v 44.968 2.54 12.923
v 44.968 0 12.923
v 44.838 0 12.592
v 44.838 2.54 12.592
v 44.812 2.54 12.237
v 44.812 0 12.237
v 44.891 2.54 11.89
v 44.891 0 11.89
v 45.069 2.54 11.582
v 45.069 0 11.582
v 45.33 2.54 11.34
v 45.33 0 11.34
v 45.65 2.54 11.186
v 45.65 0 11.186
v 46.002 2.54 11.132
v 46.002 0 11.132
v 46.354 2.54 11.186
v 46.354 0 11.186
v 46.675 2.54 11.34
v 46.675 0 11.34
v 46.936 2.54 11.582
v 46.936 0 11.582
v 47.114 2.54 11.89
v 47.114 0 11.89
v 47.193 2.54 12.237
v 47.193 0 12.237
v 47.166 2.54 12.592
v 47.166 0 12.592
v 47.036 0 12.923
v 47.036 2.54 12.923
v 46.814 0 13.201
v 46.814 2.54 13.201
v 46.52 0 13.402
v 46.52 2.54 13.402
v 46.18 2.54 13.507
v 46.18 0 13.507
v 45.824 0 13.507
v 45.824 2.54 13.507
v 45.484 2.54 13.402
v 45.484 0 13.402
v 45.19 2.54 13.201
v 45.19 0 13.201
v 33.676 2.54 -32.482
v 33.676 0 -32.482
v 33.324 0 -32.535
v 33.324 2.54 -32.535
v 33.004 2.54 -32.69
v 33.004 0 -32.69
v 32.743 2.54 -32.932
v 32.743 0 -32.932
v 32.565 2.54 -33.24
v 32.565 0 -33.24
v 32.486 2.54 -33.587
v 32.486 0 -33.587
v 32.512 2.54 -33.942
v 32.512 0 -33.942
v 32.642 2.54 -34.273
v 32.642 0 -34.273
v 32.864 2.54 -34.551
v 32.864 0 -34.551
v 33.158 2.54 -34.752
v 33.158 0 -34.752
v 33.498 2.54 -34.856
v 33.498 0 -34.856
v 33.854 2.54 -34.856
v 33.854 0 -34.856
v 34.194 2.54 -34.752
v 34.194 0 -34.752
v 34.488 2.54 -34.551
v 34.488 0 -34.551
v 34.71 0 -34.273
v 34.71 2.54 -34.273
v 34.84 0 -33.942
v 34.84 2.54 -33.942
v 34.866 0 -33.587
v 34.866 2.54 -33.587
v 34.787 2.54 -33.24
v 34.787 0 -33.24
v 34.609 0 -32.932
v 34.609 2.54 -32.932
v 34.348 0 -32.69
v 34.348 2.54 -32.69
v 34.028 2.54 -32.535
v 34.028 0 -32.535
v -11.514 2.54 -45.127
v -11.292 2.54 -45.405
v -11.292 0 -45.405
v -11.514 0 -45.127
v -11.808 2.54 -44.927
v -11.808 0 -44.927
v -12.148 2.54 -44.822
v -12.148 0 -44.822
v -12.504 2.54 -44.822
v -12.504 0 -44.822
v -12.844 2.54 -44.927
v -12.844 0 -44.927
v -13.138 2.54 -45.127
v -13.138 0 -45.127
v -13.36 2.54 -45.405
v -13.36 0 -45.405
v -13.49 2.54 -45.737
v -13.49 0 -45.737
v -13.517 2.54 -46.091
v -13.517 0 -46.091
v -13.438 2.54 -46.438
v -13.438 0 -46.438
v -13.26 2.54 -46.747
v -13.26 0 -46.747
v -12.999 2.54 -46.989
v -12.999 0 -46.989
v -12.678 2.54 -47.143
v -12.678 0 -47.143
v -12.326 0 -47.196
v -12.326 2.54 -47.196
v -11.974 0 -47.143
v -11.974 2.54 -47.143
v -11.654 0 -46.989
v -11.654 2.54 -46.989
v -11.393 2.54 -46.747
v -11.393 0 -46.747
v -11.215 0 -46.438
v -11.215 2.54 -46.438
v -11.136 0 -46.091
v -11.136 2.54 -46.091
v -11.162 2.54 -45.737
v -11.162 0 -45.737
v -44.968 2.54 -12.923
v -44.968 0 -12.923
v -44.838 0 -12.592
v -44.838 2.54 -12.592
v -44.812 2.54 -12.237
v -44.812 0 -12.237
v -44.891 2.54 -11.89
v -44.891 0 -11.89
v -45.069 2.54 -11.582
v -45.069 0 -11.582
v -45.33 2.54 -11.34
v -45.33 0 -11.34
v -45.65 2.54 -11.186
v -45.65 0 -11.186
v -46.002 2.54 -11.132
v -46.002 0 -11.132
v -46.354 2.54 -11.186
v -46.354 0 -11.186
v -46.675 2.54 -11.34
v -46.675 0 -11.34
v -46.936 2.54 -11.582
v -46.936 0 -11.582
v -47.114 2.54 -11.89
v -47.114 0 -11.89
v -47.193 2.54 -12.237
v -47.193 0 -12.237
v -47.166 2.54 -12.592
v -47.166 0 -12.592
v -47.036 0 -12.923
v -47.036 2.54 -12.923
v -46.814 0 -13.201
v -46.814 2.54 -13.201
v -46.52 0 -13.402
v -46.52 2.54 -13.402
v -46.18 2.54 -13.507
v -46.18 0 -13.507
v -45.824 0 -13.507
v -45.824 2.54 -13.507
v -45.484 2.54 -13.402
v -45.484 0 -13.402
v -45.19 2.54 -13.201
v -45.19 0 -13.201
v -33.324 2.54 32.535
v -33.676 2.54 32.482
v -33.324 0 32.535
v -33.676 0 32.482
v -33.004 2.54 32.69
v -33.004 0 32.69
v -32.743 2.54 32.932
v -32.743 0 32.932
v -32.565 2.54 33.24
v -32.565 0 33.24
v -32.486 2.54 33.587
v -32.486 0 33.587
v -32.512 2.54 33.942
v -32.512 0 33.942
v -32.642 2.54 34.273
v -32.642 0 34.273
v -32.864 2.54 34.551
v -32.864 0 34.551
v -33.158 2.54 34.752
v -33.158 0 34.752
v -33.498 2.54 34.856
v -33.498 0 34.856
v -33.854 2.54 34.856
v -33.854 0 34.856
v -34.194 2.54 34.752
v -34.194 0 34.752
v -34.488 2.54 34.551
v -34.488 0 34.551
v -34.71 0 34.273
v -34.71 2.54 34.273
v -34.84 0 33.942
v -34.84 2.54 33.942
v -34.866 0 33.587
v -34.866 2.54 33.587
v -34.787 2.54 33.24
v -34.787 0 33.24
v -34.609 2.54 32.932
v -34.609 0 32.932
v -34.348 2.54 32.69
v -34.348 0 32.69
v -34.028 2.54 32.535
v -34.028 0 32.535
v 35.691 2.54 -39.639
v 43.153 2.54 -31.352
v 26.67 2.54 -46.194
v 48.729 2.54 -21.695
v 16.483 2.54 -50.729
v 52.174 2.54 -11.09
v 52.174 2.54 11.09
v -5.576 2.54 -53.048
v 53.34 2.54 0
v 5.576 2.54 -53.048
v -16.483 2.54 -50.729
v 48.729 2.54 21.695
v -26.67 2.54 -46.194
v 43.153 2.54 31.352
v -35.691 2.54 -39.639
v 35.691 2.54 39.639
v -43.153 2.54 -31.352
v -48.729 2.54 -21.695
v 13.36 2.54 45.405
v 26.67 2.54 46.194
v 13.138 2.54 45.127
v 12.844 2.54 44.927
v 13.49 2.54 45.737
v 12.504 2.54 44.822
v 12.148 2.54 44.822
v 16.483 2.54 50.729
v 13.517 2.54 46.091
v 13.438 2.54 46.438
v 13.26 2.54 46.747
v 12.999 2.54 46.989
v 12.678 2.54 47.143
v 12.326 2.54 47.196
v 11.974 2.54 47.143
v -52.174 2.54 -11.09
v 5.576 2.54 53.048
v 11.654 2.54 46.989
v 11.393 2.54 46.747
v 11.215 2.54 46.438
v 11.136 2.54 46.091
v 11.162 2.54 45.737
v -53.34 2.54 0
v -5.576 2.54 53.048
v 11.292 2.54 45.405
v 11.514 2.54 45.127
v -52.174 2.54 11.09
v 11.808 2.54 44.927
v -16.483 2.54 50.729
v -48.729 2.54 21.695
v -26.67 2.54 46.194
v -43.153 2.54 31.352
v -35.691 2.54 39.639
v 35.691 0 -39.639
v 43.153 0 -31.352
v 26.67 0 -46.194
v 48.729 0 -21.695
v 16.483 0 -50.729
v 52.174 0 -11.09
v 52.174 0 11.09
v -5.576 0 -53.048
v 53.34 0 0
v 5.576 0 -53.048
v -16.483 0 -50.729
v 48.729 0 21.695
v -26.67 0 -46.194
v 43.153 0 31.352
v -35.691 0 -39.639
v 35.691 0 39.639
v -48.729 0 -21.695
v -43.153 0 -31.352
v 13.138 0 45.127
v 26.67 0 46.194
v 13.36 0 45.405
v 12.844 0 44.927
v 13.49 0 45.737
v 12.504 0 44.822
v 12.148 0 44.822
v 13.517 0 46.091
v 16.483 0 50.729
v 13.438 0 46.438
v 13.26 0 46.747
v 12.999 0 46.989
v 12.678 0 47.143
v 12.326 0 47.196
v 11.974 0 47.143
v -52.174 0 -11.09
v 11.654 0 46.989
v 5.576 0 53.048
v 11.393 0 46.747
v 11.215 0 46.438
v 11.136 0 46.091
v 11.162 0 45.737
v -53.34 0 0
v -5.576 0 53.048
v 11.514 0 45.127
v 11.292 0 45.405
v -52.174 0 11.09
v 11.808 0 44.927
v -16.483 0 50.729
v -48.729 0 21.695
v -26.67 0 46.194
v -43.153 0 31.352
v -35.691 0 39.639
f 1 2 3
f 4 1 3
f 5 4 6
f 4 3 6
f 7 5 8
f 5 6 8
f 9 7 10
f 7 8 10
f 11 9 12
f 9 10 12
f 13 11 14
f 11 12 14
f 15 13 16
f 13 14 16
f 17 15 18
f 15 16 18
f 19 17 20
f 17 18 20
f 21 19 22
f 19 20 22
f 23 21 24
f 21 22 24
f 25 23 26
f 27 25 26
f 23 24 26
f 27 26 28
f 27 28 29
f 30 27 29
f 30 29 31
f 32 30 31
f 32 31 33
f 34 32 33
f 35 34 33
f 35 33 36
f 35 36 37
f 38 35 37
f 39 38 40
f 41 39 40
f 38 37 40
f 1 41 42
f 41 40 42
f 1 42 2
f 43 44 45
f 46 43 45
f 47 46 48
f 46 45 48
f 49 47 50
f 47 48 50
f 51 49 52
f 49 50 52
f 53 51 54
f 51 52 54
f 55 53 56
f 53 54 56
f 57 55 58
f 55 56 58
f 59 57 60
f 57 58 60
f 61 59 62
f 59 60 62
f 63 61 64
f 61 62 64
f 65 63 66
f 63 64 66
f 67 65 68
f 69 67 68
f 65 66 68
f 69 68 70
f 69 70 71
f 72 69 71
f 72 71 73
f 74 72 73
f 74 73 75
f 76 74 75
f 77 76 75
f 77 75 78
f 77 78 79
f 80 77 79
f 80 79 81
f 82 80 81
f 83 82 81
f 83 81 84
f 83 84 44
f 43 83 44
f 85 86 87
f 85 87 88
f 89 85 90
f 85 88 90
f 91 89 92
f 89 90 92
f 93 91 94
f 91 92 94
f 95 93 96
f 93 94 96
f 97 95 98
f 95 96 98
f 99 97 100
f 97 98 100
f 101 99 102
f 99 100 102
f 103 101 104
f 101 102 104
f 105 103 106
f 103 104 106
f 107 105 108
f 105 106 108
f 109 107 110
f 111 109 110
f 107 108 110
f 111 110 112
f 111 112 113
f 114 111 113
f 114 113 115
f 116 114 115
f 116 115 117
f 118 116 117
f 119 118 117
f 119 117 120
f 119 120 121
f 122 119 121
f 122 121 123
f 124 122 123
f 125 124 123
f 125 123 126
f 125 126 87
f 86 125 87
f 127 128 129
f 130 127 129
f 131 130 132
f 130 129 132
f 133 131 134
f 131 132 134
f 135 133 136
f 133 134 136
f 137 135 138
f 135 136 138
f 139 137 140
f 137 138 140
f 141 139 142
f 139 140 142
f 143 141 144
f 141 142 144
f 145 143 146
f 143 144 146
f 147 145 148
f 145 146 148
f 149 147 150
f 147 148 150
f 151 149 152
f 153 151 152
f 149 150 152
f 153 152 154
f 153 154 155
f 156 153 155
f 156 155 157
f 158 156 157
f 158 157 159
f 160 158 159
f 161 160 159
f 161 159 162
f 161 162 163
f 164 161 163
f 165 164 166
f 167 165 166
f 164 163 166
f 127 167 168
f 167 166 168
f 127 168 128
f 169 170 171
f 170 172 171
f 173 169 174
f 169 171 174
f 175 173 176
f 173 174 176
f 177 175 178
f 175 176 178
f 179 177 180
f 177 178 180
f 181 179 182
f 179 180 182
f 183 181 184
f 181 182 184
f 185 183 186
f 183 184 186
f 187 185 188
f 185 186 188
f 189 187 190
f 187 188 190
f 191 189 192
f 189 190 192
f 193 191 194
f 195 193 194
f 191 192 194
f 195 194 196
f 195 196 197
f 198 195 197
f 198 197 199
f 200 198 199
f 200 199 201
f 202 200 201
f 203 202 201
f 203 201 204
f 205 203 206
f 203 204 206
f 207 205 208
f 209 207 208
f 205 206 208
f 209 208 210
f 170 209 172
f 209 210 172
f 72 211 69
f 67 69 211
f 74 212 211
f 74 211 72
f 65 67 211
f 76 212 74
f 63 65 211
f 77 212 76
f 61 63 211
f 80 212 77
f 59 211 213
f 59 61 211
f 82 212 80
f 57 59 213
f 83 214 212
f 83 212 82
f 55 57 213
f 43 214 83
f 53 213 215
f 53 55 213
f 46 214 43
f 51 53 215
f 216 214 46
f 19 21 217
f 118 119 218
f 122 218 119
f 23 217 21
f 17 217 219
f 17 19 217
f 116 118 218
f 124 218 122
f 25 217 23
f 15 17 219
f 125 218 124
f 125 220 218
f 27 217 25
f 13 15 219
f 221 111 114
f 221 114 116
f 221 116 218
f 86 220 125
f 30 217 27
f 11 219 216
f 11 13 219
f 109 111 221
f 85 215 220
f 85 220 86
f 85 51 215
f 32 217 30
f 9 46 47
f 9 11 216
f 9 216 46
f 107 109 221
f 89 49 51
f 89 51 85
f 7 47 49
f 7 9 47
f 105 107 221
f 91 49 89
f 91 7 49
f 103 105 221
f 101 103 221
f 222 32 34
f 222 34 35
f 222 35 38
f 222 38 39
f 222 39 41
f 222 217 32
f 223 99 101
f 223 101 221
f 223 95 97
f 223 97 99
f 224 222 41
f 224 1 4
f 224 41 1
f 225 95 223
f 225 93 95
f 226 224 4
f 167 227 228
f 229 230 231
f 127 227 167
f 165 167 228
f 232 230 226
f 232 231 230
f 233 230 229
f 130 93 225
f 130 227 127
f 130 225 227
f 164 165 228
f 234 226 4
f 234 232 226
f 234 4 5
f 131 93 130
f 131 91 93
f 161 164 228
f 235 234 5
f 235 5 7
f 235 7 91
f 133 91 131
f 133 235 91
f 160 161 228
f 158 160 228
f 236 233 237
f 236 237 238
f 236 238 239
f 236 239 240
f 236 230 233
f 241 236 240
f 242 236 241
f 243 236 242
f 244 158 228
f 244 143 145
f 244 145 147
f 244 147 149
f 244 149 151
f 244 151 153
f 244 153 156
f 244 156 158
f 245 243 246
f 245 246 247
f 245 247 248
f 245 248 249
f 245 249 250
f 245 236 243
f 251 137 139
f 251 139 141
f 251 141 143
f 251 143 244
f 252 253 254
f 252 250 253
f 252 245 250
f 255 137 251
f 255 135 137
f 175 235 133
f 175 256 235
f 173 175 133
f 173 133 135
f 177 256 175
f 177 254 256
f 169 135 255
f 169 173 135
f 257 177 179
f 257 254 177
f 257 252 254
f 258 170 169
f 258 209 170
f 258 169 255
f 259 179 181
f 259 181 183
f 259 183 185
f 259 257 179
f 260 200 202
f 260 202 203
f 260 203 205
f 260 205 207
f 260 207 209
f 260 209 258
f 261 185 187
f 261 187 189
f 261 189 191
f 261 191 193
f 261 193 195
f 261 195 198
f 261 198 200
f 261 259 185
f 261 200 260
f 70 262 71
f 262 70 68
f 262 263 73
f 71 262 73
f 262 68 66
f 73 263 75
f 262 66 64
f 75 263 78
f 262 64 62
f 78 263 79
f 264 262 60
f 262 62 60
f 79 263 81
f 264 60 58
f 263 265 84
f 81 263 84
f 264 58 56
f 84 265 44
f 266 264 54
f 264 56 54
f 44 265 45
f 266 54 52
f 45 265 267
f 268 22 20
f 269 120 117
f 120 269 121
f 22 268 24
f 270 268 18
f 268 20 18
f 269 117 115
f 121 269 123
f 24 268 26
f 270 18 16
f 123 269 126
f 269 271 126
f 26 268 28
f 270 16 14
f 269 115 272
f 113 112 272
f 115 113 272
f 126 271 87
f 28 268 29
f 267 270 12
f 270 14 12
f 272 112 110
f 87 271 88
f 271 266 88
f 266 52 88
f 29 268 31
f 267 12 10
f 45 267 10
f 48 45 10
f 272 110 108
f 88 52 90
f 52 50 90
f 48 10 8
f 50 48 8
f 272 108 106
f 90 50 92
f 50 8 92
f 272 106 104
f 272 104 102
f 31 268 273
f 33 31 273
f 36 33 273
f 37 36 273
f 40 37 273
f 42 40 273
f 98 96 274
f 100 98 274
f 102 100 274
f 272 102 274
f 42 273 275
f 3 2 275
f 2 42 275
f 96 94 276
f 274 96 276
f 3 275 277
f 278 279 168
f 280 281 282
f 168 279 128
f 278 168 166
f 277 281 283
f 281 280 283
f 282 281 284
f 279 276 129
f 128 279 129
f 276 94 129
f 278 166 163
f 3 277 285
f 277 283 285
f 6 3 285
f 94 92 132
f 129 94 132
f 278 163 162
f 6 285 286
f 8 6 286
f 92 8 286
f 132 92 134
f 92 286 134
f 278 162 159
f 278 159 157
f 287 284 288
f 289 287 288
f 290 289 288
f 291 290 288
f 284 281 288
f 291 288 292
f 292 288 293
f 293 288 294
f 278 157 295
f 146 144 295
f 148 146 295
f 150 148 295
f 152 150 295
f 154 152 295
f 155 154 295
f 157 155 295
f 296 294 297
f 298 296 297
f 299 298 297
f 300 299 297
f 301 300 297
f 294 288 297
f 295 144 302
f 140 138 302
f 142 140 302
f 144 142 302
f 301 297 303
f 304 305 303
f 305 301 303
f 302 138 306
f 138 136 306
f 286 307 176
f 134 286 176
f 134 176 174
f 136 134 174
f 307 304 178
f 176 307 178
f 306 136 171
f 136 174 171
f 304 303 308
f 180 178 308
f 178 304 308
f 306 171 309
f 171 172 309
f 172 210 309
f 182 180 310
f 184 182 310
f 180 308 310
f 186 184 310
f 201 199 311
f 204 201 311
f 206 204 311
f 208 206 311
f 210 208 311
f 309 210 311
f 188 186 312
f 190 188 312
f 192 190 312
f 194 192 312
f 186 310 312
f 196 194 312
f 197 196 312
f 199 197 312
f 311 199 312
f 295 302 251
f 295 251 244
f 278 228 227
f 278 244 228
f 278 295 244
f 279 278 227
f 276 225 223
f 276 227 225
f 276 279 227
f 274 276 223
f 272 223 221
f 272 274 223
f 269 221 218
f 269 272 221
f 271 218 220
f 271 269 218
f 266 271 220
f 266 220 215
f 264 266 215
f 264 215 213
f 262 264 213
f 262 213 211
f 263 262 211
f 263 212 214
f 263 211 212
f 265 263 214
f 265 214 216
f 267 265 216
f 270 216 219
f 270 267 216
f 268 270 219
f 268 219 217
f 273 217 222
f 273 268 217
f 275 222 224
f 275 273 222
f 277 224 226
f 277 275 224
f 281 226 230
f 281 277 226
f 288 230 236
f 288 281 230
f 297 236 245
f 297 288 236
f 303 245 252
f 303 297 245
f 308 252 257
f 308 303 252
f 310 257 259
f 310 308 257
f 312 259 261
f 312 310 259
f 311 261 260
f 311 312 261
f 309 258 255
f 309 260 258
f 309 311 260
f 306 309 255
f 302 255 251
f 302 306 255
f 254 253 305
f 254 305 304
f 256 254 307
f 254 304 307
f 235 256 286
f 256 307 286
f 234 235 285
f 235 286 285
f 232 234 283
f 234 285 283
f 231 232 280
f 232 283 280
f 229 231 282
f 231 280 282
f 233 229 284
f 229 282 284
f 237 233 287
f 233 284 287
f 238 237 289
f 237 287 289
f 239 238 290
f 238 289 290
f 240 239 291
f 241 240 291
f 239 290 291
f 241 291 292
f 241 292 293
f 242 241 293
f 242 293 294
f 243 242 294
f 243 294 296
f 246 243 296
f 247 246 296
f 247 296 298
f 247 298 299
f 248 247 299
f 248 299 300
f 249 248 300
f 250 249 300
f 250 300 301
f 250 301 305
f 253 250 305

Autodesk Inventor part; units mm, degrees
ref_plane "YZ Plane" through (0, 0, 0) normal (1, 0, 0) x (0, 1, 0)
ref_plane "XZ Plane" through (0, 0, 0) normal (0, 1, 0) x (-1, 0, 0)
ref_plane "XY Plane" through (0, 0, 0) normal (0, 0, 1) x (1, 0, 0)
sketch "Sketch1" plane through (0, 0, 0) normal (0, 1, 0) x (-1, 0, 0)
  circle A0 centre (0, 0) radius 53.34
  dimension "d0" = 106.68
extrude "Extrusion1" add sketch "Sketch1" along normal blind 2.54
sketch "Sketch2" plane through (0, 2.54, 0) normal (0, 1, 0) x (1, 0, 0)
  line L0 (0, 0) -> (33.676, 33.676) construction
  line L1 (0, 0) -> (47.625, 0) construction
  dimension "d3" = 47.625
  dimension "d4" = 45
hole "Hole1" at (33.676, 2.54, -33.676) direction (0, -1, 0) diameter 2.3876 end through all clearance for "Flat Head Machine Screw" size "M2" standard "Ansi Metric M Profile"
pattern_circular "Circular Pattern1" count 6 over 360 about axis through (0, 0, 0) along (0, 1, 0) of "Hole1"
properties part number "4K shield cover" material "Brass, Soft Yellow"
